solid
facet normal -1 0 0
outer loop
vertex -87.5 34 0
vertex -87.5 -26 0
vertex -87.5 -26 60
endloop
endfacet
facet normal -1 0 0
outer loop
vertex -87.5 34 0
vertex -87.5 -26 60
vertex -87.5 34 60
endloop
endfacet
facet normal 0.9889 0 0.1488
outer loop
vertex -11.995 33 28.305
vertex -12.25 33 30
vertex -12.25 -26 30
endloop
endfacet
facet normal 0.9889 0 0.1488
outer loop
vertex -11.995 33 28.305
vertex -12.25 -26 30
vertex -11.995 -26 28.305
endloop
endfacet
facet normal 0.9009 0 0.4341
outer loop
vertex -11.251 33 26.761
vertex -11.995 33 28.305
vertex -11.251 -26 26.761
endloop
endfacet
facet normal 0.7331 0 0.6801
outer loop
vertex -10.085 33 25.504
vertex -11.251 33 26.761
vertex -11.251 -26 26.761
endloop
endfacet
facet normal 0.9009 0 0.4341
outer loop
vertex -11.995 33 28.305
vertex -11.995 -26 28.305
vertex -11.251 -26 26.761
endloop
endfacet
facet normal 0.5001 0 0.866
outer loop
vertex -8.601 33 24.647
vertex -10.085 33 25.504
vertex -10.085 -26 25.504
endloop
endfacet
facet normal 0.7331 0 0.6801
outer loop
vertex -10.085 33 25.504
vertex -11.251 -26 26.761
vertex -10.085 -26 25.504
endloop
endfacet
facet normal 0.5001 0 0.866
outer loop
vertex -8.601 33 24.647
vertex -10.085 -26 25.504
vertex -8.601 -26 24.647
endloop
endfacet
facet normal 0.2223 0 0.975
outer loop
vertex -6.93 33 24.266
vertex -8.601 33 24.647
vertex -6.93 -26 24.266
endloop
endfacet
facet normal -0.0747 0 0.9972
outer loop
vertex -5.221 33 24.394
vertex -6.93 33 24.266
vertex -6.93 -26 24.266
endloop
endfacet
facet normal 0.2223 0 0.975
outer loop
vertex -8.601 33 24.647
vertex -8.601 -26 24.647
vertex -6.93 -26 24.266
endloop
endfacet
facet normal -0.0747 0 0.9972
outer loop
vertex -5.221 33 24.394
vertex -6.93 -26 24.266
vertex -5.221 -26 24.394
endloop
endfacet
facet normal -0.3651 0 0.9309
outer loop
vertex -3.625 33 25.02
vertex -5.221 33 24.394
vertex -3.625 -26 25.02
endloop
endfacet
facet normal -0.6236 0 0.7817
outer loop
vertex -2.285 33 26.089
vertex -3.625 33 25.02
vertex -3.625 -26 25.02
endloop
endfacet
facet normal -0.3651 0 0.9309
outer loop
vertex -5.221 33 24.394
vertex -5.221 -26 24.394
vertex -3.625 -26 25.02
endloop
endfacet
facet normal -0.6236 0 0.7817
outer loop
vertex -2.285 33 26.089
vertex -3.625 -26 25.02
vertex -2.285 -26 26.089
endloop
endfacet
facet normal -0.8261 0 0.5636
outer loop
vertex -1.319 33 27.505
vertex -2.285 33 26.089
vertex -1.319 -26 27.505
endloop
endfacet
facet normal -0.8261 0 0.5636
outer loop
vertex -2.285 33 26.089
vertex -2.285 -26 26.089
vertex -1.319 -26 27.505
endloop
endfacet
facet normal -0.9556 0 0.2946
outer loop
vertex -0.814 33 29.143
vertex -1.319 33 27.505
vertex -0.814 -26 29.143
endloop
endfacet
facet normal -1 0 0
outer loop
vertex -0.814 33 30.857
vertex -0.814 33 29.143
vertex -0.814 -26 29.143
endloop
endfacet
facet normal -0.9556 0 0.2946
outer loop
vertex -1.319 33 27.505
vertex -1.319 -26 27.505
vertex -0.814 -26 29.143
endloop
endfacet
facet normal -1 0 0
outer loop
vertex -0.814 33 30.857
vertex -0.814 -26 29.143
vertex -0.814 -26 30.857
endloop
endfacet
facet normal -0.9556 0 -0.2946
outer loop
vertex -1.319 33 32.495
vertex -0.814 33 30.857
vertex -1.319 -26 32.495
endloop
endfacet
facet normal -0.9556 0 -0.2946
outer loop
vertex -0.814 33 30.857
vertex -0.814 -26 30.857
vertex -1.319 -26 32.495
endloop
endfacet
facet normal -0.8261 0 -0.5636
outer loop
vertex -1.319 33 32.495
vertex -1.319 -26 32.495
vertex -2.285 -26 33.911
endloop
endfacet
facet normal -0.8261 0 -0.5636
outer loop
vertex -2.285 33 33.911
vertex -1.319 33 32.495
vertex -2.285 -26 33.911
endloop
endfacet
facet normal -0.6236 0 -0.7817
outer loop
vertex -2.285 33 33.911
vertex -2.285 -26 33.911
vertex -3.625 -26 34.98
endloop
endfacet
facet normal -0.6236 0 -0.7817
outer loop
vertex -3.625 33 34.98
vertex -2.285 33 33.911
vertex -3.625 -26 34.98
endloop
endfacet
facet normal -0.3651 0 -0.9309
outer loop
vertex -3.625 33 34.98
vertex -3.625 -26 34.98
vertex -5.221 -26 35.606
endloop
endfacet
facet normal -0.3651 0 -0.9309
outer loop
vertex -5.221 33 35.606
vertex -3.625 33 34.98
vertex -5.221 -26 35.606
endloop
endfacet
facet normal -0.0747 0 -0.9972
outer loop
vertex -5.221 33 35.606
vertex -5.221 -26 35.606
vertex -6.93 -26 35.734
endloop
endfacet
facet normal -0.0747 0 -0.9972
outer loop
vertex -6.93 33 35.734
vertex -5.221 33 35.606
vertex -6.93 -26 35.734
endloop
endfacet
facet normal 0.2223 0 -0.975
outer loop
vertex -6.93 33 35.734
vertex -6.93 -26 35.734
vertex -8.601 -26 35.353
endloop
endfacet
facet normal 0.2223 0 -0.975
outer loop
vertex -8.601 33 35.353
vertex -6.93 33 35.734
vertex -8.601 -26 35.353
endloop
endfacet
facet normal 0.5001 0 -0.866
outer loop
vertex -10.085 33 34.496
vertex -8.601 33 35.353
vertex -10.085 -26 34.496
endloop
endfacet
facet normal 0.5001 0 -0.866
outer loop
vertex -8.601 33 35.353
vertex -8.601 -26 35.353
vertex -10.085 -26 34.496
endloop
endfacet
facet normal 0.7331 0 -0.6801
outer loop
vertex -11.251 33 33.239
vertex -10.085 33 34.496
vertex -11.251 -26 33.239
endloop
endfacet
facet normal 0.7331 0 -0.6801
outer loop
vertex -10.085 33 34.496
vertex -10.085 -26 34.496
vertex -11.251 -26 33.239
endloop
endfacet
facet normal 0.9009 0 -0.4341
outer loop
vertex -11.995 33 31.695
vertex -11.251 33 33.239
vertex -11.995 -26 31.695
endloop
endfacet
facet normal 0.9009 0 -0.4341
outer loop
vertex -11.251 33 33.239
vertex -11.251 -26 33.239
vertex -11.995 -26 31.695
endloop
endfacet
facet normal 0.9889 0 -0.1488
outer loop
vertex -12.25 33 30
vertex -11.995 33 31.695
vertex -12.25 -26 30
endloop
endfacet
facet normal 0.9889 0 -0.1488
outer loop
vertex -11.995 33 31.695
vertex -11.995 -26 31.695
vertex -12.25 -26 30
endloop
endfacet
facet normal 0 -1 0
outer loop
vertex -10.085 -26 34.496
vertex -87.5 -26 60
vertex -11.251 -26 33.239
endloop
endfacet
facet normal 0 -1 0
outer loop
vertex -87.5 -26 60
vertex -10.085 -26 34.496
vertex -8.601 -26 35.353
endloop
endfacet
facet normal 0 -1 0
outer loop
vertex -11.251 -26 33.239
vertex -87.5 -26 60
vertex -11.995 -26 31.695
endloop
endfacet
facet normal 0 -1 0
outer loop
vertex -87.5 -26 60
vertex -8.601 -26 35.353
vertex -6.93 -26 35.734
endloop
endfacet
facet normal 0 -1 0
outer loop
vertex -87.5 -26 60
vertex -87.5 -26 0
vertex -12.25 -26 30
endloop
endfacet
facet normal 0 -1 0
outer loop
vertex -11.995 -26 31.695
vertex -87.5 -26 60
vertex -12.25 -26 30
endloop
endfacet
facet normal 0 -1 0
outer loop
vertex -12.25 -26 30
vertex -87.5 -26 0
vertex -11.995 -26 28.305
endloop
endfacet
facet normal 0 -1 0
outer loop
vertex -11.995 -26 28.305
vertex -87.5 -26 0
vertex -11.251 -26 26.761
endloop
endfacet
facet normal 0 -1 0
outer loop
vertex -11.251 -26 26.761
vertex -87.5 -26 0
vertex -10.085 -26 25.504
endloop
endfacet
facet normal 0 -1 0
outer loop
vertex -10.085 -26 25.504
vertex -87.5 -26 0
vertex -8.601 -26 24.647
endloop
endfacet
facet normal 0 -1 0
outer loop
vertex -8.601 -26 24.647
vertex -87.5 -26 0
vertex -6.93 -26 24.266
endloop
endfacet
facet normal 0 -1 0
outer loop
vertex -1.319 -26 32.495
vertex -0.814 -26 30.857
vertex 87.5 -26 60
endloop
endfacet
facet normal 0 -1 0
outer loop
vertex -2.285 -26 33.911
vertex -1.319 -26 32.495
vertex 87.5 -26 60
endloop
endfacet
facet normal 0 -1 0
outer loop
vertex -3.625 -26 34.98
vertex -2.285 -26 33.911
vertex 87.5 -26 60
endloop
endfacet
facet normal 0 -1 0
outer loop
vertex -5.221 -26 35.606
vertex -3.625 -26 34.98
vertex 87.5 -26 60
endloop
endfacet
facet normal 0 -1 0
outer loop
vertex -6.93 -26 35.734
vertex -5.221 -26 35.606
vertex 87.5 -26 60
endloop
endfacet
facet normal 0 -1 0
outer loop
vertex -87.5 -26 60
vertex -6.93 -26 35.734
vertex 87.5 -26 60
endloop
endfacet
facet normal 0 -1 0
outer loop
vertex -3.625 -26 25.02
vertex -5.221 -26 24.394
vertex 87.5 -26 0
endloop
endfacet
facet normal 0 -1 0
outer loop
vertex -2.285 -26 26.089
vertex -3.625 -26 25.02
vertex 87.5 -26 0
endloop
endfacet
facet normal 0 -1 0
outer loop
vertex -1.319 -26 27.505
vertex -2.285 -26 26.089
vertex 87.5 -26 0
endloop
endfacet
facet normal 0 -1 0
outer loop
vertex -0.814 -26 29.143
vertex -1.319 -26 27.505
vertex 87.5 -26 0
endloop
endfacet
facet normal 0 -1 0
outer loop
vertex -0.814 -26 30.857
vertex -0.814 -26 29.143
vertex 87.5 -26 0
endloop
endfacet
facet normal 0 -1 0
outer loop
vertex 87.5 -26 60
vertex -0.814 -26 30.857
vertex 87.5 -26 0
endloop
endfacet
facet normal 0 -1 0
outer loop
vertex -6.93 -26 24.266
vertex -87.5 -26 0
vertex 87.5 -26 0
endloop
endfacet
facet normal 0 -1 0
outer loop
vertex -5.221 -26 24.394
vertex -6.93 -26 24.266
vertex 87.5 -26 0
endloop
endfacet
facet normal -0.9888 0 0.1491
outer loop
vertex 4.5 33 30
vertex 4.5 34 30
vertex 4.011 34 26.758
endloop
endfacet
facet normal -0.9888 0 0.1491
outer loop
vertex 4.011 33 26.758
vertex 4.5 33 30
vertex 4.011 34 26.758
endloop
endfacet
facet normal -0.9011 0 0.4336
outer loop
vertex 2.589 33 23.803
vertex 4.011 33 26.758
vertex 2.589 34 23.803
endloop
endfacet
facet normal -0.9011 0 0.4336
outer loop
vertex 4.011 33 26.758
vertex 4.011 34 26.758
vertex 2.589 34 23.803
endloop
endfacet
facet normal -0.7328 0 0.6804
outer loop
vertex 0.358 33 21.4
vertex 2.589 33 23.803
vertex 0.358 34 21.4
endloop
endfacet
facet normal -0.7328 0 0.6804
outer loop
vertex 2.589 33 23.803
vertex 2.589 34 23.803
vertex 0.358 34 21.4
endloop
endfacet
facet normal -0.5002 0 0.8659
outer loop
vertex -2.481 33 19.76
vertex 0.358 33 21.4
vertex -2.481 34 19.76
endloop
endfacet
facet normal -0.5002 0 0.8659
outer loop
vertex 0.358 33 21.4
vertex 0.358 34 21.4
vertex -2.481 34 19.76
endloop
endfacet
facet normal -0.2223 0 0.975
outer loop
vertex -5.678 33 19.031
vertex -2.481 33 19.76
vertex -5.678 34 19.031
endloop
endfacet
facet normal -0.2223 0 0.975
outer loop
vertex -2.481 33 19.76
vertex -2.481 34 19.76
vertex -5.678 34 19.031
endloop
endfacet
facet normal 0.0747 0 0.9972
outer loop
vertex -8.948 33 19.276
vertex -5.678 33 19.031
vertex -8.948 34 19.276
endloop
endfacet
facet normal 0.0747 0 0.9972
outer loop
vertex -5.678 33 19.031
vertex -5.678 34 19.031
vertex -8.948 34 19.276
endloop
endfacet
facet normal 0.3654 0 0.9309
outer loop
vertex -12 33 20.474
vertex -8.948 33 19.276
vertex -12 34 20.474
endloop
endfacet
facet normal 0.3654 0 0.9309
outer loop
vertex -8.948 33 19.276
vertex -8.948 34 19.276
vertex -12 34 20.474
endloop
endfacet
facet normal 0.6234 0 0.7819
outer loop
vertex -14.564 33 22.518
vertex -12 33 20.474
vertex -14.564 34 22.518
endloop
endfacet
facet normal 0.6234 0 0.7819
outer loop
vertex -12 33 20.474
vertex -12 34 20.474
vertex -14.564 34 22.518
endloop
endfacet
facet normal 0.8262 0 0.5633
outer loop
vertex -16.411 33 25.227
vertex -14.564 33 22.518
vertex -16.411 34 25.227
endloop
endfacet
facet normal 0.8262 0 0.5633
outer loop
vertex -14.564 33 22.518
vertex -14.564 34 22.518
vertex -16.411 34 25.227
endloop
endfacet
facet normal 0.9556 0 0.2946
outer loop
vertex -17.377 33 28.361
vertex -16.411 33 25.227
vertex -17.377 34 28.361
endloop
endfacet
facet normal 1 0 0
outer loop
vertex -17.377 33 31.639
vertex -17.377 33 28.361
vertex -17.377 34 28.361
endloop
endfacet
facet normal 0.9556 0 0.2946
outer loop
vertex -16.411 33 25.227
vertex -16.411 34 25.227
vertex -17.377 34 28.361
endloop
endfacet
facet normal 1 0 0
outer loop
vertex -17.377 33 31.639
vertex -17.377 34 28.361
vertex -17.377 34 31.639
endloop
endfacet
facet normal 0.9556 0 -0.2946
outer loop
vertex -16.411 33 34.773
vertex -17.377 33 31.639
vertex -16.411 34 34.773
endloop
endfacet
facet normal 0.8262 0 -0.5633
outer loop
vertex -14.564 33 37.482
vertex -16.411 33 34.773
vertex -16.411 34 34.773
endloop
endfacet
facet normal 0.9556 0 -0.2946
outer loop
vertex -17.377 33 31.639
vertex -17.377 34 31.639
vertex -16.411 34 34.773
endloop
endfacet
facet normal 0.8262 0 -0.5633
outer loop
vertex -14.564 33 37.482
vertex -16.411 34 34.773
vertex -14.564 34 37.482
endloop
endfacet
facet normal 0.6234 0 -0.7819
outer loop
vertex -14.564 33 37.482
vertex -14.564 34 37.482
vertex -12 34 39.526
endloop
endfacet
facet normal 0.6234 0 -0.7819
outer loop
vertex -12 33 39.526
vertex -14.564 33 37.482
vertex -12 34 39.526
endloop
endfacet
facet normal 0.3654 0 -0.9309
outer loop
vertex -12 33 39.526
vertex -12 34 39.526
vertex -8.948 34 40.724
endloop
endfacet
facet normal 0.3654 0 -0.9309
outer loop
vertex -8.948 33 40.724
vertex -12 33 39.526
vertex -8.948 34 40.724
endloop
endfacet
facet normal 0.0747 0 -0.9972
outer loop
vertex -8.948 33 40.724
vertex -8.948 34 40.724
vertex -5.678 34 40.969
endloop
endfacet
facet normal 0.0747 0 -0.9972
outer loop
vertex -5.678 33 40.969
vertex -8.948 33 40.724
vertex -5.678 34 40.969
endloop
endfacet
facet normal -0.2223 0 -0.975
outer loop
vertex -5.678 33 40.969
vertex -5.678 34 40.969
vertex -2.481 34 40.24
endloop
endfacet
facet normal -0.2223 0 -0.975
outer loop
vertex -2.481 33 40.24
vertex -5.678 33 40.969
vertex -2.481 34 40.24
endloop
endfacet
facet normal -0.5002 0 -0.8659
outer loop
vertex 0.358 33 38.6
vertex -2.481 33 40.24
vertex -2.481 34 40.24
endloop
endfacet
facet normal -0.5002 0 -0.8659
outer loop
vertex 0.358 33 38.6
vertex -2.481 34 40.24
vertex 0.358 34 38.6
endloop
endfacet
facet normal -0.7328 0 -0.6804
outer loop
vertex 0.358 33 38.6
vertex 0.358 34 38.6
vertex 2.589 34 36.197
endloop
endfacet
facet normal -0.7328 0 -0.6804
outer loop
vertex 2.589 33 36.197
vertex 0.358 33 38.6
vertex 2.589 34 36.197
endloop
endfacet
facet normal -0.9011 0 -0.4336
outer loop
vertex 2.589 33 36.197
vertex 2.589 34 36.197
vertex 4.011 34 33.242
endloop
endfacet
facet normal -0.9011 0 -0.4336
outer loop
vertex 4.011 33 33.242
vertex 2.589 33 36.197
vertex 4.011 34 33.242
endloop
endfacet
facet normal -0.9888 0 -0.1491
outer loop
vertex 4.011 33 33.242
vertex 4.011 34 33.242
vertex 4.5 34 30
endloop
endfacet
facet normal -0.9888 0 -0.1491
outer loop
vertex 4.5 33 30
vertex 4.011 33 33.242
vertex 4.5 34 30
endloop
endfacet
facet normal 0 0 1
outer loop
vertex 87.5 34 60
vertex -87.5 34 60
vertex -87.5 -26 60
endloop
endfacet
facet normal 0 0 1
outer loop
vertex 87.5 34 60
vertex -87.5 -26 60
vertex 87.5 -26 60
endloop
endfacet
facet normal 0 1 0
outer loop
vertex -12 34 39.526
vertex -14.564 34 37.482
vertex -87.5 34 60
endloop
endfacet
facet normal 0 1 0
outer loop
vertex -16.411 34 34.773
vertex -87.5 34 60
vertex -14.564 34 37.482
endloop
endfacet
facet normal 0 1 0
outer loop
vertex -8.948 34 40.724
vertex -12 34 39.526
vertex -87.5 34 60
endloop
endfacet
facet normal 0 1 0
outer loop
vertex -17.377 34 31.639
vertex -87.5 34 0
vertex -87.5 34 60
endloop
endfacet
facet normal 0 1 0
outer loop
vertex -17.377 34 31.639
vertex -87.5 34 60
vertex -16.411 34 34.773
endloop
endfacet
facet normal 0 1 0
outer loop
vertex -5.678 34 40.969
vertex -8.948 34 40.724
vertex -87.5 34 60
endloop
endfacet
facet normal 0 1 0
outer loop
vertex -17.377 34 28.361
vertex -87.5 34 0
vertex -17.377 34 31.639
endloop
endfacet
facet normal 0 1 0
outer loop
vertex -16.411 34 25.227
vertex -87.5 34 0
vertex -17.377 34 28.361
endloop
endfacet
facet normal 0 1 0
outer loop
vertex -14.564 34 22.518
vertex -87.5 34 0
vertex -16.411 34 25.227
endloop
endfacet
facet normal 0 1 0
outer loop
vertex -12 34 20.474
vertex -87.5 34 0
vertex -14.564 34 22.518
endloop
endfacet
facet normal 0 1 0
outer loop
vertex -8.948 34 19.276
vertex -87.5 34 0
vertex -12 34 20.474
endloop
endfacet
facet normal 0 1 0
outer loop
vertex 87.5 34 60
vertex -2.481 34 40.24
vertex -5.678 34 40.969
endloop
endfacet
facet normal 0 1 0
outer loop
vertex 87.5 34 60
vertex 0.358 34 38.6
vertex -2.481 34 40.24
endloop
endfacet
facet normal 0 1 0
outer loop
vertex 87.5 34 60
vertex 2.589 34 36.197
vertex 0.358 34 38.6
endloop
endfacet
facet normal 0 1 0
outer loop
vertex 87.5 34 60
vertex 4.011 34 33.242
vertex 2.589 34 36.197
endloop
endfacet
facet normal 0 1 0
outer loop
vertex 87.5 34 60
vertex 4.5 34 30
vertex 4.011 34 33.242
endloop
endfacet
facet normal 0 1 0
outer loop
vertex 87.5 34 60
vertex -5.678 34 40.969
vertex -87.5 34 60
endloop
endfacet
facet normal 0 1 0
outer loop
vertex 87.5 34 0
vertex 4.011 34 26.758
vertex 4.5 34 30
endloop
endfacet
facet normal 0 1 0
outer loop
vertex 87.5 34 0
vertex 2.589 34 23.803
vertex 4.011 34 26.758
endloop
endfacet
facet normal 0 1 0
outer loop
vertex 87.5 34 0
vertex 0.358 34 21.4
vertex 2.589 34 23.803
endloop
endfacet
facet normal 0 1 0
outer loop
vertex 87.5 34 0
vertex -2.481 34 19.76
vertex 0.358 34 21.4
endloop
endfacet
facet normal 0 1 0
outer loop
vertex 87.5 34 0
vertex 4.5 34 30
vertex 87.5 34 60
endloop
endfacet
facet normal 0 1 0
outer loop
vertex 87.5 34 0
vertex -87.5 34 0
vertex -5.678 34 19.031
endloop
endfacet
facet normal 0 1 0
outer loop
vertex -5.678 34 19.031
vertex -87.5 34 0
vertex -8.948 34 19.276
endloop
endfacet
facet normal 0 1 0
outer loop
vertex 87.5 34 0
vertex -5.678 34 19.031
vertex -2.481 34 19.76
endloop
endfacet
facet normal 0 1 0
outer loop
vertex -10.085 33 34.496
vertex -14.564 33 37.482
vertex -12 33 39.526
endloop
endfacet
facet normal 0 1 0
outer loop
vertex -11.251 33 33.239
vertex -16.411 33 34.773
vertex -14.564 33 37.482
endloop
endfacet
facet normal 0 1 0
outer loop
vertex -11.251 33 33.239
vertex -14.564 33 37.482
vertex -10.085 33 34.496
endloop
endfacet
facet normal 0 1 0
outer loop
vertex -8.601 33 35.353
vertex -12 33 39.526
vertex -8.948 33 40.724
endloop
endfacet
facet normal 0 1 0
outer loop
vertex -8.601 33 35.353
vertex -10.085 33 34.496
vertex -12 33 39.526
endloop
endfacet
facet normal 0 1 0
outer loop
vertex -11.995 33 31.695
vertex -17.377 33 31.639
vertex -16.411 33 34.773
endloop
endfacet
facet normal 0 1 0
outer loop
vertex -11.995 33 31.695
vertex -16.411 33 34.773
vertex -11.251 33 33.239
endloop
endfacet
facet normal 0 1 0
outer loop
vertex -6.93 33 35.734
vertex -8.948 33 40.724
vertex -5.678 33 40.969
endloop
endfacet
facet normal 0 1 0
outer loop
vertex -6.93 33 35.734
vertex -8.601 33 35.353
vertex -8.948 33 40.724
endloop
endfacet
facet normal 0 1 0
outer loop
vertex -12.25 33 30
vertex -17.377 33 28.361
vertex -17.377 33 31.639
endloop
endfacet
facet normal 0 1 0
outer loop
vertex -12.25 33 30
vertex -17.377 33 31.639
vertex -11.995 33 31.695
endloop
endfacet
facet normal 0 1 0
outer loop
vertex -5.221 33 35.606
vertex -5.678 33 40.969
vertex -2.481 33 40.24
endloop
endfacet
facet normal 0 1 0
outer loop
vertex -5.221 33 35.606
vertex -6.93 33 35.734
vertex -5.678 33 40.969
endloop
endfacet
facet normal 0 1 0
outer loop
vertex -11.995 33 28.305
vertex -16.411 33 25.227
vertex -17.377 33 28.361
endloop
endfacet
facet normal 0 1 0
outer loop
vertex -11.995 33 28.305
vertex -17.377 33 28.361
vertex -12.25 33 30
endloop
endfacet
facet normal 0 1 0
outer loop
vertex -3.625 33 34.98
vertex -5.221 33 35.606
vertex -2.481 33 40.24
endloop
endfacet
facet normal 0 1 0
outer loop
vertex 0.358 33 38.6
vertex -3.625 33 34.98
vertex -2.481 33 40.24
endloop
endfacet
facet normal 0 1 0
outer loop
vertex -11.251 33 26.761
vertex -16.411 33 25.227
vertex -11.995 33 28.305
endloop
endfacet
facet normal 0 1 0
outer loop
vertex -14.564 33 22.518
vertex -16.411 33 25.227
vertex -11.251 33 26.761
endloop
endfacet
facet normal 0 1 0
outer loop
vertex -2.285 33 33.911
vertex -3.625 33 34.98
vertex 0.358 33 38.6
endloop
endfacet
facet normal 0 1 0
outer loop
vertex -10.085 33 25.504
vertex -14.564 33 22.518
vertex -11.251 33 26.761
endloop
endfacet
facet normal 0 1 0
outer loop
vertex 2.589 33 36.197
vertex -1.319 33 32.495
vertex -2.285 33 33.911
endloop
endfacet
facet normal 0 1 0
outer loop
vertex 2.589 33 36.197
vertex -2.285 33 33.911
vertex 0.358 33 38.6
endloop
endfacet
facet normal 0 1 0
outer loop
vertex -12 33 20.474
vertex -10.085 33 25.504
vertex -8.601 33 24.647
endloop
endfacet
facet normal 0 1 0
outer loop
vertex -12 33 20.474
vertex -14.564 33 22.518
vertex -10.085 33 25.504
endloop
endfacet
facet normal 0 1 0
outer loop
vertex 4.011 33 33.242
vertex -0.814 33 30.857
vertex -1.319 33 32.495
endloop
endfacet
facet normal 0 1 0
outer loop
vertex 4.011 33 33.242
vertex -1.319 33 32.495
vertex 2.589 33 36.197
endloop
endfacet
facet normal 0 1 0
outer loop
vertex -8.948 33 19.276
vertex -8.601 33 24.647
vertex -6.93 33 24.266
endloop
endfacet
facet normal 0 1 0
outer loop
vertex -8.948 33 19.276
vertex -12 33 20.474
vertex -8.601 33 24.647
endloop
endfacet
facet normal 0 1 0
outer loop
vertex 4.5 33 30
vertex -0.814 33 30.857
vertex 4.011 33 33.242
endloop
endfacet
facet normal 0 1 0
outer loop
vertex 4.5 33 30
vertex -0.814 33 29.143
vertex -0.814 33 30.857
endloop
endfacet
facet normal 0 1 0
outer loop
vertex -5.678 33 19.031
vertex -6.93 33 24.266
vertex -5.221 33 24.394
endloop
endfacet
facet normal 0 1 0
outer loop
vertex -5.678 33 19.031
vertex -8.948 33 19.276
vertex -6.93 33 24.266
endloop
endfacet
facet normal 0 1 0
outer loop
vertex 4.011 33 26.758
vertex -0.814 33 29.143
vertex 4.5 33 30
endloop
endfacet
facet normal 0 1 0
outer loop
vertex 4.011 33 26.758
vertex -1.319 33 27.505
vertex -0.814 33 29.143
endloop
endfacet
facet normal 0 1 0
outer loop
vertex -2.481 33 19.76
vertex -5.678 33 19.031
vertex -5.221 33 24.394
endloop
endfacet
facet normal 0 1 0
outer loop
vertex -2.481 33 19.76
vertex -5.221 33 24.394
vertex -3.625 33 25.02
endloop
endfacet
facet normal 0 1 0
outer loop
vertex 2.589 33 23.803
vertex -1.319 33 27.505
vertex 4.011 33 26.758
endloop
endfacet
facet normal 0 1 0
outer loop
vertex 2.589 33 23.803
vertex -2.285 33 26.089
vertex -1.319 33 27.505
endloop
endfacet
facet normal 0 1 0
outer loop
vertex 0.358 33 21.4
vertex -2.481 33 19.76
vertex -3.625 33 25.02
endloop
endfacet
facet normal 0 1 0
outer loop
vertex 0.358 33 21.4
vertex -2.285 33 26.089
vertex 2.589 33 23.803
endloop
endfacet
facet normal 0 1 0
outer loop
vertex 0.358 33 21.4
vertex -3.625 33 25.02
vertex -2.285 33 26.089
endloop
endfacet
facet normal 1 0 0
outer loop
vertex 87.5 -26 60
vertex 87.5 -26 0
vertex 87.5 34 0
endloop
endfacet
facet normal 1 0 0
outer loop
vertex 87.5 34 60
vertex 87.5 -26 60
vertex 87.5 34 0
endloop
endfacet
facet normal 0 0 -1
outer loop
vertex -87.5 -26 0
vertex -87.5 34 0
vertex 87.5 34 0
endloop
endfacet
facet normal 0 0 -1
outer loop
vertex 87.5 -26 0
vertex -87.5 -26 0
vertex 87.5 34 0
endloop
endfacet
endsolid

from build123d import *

# Parameters (mm, degrees)
ESQUISSE1_W          = 175
ESQUISSE1_H          = 60
EXTRUSION1_DEPTH     = 60
PER_AGE1_D           = 11.5
PER_AGE1_CBORE_D     = 22
PER_AGE1_CBORE_DEPTH = 1


with BuildPart() as part:
    # Esquisse1 → Extrusion1 (new body)
    with BuildSketch(Plane.XY):
        with Locations((0, 4)):
            Rectangle(ESQUISSE1_W, ESQUISSE1_H)
    extrude(amount=EXTRUSION1_DEPTH)

    # Perçage1 (through all)
    with Locations(Plane(origin=(-6.5, 34, 30), x_dir=(1, 0, 0), z_dir=(0, 1, 0))):
        with Locations((0, 0)):
            CounterBoreHole(PER_AGE1_D / 2, PER_AGE1_CBORE_D / 2, PER_AGE1_CBORE_DEPTH)


solid = part.part
